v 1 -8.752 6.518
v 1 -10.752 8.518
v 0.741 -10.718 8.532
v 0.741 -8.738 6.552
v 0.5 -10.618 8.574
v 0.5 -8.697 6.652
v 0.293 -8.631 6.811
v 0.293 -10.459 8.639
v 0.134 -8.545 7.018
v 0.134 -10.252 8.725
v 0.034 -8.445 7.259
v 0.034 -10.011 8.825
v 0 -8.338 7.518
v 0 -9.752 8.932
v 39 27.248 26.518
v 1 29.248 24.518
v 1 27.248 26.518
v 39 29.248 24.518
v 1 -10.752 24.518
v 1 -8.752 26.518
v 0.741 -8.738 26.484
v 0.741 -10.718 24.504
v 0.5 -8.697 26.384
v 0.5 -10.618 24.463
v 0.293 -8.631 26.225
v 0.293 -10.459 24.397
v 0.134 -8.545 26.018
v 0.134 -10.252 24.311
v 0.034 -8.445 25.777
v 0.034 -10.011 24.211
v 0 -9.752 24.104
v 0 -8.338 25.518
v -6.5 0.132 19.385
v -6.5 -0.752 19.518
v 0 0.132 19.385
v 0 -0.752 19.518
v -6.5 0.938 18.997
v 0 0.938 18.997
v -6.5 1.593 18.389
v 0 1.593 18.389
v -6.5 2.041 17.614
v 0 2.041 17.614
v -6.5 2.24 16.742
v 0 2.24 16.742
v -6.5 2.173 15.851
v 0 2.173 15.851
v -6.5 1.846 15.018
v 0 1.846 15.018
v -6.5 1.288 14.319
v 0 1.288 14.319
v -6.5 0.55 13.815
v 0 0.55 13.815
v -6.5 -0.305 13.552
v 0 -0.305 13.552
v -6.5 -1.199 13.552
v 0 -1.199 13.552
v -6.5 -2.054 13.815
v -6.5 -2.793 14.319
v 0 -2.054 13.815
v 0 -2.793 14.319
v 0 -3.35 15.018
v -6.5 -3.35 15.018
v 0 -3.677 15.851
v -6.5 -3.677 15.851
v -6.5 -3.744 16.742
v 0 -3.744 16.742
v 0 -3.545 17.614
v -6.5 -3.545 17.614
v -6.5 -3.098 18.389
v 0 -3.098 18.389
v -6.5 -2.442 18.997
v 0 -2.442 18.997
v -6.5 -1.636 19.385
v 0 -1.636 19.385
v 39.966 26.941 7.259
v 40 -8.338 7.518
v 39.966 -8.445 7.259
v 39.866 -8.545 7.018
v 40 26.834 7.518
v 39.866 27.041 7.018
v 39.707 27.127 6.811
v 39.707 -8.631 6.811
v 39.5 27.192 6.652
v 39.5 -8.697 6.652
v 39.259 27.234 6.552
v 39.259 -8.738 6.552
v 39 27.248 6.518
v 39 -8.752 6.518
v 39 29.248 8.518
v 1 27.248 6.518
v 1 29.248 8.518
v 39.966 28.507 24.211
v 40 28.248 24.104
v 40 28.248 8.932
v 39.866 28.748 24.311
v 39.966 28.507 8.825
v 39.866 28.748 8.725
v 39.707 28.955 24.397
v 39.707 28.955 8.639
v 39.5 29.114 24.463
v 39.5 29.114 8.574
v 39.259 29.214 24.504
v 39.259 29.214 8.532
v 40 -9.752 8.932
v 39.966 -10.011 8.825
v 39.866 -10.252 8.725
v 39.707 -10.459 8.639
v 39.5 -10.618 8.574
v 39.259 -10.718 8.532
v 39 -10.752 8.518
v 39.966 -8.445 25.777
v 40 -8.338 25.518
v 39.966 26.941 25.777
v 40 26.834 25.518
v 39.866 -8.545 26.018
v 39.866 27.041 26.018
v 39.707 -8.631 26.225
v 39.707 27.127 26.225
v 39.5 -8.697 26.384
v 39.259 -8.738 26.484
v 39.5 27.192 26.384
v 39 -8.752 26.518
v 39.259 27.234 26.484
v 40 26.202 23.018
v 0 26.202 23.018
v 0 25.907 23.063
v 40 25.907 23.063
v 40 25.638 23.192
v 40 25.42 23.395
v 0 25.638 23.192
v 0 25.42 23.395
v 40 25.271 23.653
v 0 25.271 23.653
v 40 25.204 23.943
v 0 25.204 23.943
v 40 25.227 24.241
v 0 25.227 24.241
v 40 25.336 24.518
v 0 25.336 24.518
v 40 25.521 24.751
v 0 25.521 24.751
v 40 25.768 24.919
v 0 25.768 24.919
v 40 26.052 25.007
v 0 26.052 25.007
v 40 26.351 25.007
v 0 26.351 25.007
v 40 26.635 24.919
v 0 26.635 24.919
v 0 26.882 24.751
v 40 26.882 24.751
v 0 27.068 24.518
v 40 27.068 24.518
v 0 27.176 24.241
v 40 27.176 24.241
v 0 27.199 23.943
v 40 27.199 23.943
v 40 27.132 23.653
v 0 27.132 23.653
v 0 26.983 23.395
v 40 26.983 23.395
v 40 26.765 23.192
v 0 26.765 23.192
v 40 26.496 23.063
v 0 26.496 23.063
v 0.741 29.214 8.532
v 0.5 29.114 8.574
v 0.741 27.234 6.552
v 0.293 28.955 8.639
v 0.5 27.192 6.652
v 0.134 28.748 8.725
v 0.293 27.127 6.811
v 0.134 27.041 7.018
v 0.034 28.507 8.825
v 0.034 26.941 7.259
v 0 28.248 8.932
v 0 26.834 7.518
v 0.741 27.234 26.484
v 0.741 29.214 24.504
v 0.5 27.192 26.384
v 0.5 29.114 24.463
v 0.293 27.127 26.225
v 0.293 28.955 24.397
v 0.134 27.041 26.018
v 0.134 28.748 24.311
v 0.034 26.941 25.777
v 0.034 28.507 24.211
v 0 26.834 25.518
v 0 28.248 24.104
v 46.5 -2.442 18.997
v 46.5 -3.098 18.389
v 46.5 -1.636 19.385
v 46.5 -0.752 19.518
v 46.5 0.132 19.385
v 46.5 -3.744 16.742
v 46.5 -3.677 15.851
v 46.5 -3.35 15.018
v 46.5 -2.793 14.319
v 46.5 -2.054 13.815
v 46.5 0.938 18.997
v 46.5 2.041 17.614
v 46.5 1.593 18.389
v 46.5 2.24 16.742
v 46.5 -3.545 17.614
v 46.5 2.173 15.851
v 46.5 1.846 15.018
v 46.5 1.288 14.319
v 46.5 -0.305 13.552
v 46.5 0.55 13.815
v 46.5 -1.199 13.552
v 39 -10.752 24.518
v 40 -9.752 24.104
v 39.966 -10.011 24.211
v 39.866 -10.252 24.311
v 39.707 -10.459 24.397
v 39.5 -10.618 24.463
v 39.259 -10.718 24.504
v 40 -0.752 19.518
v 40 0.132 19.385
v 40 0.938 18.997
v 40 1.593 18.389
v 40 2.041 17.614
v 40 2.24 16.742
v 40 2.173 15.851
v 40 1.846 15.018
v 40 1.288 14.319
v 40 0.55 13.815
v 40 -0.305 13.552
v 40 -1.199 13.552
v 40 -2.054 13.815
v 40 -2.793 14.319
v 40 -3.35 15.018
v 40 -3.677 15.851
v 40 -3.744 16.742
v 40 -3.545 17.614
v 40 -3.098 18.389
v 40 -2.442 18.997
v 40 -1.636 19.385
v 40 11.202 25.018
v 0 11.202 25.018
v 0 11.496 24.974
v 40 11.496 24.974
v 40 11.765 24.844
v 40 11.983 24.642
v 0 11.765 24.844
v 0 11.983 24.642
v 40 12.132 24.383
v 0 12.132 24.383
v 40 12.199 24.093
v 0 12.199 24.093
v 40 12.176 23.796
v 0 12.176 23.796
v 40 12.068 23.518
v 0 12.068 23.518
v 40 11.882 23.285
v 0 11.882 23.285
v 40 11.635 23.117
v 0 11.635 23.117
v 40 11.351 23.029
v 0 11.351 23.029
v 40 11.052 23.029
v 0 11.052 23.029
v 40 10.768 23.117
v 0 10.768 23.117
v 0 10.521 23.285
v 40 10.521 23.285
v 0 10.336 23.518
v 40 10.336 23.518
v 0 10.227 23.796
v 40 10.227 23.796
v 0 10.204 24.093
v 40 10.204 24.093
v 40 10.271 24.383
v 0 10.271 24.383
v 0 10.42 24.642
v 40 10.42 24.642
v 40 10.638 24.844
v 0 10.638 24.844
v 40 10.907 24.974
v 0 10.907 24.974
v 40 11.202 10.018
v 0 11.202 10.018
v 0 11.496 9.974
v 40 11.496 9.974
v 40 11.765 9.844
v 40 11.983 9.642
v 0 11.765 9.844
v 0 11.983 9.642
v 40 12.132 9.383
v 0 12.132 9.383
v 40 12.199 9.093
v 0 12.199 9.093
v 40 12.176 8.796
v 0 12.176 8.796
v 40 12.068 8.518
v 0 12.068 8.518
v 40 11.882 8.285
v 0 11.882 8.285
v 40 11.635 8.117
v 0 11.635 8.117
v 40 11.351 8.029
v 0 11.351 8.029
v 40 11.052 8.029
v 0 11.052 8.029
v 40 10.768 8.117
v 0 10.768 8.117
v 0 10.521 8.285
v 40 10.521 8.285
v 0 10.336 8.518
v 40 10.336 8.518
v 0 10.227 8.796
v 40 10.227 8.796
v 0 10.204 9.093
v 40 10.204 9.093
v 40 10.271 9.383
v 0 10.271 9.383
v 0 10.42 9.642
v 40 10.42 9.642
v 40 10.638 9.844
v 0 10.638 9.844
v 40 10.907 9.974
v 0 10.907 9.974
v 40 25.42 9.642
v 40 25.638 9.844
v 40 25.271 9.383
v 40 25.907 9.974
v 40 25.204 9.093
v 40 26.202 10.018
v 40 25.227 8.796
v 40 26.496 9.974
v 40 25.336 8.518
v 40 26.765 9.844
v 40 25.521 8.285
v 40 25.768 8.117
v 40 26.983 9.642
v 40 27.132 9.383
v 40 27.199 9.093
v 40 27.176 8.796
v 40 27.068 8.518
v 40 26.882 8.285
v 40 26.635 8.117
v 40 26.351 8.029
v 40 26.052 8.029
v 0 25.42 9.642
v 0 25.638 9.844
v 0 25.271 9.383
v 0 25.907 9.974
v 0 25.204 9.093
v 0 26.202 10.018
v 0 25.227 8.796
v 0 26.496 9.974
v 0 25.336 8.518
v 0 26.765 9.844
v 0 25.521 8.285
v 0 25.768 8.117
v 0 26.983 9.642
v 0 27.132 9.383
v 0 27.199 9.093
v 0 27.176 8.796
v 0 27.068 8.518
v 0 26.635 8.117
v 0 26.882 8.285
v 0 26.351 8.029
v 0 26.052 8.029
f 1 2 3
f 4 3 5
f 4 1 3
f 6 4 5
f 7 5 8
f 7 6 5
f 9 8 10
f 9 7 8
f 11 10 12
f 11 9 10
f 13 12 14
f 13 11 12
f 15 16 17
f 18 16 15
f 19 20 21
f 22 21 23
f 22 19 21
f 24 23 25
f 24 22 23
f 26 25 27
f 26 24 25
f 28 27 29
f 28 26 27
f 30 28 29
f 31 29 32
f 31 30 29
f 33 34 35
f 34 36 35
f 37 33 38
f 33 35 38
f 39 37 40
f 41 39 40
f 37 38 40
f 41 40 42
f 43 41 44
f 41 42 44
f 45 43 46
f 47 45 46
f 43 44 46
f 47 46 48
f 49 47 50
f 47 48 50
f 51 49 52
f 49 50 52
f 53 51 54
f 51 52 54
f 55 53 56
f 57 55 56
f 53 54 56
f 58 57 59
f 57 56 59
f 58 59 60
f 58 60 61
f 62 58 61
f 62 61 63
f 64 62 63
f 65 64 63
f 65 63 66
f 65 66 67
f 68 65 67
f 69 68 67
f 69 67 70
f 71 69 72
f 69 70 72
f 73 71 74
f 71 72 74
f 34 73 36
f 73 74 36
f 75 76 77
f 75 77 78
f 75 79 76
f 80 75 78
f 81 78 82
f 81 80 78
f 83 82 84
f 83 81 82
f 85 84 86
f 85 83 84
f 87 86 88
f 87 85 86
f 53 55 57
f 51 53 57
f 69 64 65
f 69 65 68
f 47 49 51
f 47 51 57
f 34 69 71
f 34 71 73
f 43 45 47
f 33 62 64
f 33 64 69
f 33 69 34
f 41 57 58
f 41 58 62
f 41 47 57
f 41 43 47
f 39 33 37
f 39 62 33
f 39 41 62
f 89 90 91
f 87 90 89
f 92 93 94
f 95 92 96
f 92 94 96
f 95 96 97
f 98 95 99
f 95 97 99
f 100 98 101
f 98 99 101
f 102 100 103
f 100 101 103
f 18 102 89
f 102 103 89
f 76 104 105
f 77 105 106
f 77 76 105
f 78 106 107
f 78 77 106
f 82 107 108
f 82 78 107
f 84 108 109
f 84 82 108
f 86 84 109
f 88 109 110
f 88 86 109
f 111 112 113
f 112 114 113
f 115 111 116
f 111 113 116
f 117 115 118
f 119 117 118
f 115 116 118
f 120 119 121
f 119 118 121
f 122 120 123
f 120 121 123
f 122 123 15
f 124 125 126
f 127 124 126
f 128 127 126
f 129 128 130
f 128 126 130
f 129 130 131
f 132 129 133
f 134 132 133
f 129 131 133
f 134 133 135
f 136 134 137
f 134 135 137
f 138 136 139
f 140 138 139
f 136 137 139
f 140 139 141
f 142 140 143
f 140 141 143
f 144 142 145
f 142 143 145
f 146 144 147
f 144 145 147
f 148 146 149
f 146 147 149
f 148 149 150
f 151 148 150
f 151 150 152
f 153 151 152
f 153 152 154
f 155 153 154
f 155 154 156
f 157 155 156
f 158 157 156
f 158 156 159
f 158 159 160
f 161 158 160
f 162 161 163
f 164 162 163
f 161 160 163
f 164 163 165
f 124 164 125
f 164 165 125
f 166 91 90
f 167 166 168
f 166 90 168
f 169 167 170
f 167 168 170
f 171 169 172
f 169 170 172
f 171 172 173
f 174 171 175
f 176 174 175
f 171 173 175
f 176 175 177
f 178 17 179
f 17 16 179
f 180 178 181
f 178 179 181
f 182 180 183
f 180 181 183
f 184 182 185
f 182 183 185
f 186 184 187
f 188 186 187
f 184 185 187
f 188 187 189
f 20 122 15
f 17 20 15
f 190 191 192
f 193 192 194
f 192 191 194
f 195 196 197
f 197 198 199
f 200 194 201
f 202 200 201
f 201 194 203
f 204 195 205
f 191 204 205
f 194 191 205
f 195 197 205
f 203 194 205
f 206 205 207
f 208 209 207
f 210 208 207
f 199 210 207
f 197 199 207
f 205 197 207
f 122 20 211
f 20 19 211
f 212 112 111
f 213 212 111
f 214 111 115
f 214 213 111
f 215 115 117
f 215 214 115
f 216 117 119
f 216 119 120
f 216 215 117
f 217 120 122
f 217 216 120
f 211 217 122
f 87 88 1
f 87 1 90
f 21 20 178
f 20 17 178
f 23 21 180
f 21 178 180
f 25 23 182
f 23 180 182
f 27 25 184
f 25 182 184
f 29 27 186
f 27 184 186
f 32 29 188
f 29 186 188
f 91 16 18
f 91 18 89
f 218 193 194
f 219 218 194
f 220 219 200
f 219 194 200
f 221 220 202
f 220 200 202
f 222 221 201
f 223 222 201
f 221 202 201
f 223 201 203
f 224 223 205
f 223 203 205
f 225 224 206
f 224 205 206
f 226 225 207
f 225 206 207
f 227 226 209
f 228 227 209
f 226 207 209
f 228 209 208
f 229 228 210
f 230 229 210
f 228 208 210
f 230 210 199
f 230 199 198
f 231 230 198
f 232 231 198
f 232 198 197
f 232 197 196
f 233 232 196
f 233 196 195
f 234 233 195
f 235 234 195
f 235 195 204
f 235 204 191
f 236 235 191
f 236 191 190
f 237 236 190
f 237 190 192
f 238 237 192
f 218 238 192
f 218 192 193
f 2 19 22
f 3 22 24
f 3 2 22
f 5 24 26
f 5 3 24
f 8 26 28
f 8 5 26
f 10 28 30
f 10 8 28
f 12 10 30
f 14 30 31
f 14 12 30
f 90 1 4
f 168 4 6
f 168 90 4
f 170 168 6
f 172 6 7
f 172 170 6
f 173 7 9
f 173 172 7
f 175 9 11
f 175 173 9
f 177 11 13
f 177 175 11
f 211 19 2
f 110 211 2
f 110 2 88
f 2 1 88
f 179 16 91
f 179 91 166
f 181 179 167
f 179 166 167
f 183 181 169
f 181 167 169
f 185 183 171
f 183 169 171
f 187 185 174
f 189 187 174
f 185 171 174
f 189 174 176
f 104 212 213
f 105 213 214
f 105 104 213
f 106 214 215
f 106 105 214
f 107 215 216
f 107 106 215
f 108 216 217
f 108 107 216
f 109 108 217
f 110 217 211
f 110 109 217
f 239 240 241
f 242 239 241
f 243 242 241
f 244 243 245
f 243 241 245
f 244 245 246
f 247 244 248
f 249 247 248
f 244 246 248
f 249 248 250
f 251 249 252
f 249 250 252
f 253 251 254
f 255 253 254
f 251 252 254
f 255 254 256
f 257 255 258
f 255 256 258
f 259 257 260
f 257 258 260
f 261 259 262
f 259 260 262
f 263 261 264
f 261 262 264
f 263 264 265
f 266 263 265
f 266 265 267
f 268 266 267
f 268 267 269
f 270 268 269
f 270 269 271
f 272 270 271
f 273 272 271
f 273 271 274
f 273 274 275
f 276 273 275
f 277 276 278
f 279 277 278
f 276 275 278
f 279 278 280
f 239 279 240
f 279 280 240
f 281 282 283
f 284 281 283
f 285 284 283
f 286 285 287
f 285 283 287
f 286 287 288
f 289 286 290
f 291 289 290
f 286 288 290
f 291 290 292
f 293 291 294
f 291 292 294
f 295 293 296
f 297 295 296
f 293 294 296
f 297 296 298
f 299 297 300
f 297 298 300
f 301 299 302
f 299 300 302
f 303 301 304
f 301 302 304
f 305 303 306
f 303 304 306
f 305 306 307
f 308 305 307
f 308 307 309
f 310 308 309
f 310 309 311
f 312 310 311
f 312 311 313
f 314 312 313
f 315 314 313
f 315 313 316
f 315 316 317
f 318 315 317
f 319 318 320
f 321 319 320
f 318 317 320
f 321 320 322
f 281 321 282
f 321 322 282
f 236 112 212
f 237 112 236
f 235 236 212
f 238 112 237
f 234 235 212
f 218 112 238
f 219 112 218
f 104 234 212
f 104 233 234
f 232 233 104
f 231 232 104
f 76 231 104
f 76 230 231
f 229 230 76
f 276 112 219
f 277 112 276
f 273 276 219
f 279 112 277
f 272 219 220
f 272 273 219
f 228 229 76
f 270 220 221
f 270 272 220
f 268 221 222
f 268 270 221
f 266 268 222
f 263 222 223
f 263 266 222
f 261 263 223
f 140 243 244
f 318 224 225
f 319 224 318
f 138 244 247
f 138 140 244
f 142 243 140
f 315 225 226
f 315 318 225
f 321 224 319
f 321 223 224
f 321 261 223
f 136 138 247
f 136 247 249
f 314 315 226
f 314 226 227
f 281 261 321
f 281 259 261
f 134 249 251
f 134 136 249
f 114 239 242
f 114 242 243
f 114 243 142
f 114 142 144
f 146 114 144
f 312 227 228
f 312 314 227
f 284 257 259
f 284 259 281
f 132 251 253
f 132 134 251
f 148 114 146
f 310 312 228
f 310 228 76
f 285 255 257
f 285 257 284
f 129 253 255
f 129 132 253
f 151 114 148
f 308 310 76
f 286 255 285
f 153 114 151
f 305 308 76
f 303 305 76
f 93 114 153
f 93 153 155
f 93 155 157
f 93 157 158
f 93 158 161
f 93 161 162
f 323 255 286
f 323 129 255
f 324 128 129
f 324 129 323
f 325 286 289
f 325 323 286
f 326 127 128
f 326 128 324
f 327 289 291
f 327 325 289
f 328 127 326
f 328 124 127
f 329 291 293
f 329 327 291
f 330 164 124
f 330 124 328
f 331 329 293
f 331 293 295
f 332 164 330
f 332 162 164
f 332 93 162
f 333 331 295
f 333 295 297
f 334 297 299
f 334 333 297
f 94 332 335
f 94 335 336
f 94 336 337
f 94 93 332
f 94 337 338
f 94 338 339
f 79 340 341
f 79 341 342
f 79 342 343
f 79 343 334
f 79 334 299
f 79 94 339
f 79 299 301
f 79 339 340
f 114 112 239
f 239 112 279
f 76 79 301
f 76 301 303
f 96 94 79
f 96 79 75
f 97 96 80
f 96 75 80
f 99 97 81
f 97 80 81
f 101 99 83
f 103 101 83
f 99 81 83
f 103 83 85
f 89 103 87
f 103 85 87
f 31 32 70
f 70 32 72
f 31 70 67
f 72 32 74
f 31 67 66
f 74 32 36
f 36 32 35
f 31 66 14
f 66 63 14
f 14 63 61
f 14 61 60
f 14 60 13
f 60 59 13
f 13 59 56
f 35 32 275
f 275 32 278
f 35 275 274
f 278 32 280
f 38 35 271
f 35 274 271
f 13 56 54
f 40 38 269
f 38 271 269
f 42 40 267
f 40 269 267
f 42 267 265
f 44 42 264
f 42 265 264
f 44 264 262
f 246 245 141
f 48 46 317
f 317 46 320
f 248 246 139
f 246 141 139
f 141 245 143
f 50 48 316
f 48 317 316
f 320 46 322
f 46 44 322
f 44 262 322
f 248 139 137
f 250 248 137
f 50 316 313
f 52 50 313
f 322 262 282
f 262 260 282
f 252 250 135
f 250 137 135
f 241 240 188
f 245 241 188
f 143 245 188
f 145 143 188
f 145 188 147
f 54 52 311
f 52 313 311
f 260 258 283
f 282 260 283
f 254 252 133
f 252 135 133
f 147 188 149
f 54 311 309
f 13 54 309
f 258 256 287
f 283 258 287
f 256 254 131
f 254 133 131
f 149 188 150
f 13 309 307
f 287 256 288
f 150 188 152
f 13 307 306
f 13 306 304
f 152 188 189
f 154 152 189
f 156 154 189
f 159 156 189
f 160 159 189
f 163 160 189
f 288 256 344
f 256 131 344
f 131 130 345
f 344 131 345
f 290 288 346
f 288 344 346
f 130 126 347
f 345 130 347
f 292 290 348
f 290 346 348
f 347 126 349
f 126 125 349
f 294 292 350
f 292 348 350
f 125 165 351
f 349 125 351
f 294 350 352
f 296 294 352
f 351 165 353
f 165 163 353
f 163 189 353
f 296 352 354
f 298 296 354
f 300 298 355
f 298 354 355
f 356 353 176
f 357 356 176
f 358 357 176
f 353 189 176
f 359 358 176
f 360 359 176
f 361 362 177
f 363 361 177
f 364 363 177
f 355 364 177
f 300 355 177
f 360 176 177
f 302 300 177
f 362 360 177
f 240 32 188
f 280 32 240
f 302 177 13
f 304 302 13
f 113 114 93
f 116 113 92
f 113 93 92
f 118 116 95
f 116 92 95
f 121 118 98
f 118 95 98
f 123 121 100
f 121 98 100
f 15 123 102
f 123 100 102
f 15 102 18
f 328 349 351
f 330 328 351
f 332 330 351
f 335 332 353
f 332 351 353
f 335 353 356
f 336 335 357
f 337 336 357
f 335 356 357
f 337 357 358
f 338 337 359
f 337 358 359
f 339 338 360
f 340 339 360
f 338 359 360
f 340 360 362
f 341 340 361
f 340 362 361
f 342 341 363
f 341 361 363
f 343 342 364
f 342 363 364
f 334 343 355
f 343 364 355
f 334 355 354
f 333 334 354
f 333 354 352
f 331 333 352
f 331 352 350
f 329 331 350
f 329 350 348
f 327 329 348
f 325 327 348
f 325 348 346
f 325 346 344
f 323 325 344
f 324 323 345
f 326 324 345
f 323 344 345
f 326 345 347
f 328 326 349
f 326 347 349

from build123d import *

# Parameters (mm, degrees)
SKETCH_1_W           = 20
SKETCH_1_H           = 40
EXTRUDE_1_DEPTH      = 40
SKETCH_2_R           = 1
CUT_EXTRUDE_3_DEPTH  = 40
EXTRUDE_2_DEPTH      = 5
EXTRUDE_2_DEPTH_BACK = 45
SKETCH_4_R           = 1.5
CHAMFER_1_SIZE       = 2
FILLET_1_R           = 1
SKETCH_5_R           = 3
EXTRUDE_3_DEPTH      = 50
EXTRUDE_4_DEPTH      = 1.5
EXTRUDE_4_DEPTH_BACK = 53
SKETCH_7_R           = 3
SKETCH_12_W          = 1.5
SKETCH_12_H          = 6.856105301
CUT_EXTRUDE_6_DEPTH  = 25.5
EXTRUDE_START        = 6.5
SKETCH_9_R           = 3
EXTRUDE_7_DEPTH      = 6.5


with BuildPart() as part:
    # ｽｹｯﾁ1 → ﾎﾞｽ - 押し出し1 (new body)
    with BuildSketch(Plane(origin=(0, 0, 0), x_dir=(0, 0, -1), z_dir=(1, 0, 0))):
        with Locations((-16.51810585, 9.247910864)):
            Rectangle(SKETCH_1_W, SKETCH_1_H)
    extrude(amount=EXTRUDE_1_DEPTH)

    # ｽｹｯﾁ2 → ｶｯﾄ - 押し出し3 (cut)
    with BuildSketch(Plane.ZY):
        with Locations((9.01810585, 26.201539891)):
            Circle(SKETCH_2_R)
        with Locations((9.01810585, 11.201539891)):
            Circle(SKETCH_2_R)
        with Locations((24.01810585, 11.201539891)):
            Circle(SKETCH_2_R)
        with Locations(Location((24.01810585, 26.201539891, 0), (0, 0, 180))):
            Circle(SKETCH_2_R)
    extrude(amount=-CUT_EXTRUDE_3_DEPTH, mode=Mode.SUBTRACT)

    # ｽｹｯﾁ4 → ﾎﾞｽ - 押し出し2 (add, two sides: drawn at the far end of the back side and taken through both)
    with BuildSketch(Plane.ZY.offset(-EXTRUDE_2_DEPTH_BACK)):
        with Locations((16.51810585, -0.752089136)):
            Circle(SKETCH_4_R)
    extrude(amount=EXTRUDE_2_DEPTH + EXTRUDE_2_DEPTH_BACK)

    # 面取り1
    chamfer_1_edges = [part.edges().sort_by_distance(p)[0] for p in [
        (20, -10.752089136, 6.51810585),
        (20, -10.752089136, 26.51810585),
        (20, 29.247910864, 26.51810585),
        (20, 29.247910864, 6.51810585),
    ]]
    chamfer(chamfer_1_edges, length=CHAMFER_1_SIZE)

    # ﾌｨﾚｯﾄ1
    fillet_1_edges = [part.edges().sort_by_distance(p)[0] for p in [
        (0, 9.247910864, 26.51810585),
        (40, 9.247910864, 26.51810585),
        (0, 9.247910864, 6.51810585),
        (0, -10.752089136, 16.51810585),
        (0, 29.247910864, 16.51810585),
        (0, -9.752089136, 25.51810585),
        (0, -9.752089136, 7.51810585),
        (0, 28.247910864, 7.51810585),
        (0, 28.247910864, 25.51810585),
        (40, 29.247910864, 16.51810585),
        (40, 9.247910864, 6.51810585),
        (40, -10.752089136, 16.51810585),
        (40, -9.752089136, 25.51810585),
        (40, -9.752089136, 7.51810585),
        (40, 28.247910864, 7.51810585),
        (40, 28.247910864, 25.51810585),
    ]]
    fillet(fillet_1_edges, radius=FILLET_1_R)

    # ｽｹｯﾁ5 → ﾎﾞｽ - 押し出し3 (add)
    with BuildSketch(Plane.ZY.offset(5)):
        with Locations((16.51810585, -0.752089136)):
            Circle(SKETCH_5_R)
    extrude(amount=-EXTRUDE_3_DEPTH)

    # ｽｹｯﾁ7 → ﾎﾞｽ - 押し出し4 (add, two sides: drawn at the far end of the back side and taken through both)
    with BuildSketch(Plane.ZY.offset(5).offset(-EXTRUDE_4_DEPTH_BACK)):
        with Locations((16.51810585, -0.752089136)):
            Circle(SKETCH_7_R)
    extrude(amount=EXTRUDE_4_DEPTH + EXTRUDE_4_DEPTH_BACK)

    # ｽｹｯﾁ12 → ｶｯﾄ - 押し出し6 (cut)
    with BuildSketch(Plane.XY):
        with Locations((47.25, -0.324036486)):
            Rectangle(SKETCH_12_W, SKETCH_12_H)
    extrude(amount=CUT_EXTRUDE_6_DEPTH, mode=Mode.SUBTRACT)

    # ｽｹｯﾁ9 → ﾎﾞｽ - 押し出し7 (add)
    with BuildSketch(Plane.ZY.offset(EXTRUDE_START)):
        with Locations((16.51810585, -0.752089136)):
            Circle(SKETCH_9_R)
    extrude(amount=-EXTRUDE_7_DEPTH)


solid = part.part
